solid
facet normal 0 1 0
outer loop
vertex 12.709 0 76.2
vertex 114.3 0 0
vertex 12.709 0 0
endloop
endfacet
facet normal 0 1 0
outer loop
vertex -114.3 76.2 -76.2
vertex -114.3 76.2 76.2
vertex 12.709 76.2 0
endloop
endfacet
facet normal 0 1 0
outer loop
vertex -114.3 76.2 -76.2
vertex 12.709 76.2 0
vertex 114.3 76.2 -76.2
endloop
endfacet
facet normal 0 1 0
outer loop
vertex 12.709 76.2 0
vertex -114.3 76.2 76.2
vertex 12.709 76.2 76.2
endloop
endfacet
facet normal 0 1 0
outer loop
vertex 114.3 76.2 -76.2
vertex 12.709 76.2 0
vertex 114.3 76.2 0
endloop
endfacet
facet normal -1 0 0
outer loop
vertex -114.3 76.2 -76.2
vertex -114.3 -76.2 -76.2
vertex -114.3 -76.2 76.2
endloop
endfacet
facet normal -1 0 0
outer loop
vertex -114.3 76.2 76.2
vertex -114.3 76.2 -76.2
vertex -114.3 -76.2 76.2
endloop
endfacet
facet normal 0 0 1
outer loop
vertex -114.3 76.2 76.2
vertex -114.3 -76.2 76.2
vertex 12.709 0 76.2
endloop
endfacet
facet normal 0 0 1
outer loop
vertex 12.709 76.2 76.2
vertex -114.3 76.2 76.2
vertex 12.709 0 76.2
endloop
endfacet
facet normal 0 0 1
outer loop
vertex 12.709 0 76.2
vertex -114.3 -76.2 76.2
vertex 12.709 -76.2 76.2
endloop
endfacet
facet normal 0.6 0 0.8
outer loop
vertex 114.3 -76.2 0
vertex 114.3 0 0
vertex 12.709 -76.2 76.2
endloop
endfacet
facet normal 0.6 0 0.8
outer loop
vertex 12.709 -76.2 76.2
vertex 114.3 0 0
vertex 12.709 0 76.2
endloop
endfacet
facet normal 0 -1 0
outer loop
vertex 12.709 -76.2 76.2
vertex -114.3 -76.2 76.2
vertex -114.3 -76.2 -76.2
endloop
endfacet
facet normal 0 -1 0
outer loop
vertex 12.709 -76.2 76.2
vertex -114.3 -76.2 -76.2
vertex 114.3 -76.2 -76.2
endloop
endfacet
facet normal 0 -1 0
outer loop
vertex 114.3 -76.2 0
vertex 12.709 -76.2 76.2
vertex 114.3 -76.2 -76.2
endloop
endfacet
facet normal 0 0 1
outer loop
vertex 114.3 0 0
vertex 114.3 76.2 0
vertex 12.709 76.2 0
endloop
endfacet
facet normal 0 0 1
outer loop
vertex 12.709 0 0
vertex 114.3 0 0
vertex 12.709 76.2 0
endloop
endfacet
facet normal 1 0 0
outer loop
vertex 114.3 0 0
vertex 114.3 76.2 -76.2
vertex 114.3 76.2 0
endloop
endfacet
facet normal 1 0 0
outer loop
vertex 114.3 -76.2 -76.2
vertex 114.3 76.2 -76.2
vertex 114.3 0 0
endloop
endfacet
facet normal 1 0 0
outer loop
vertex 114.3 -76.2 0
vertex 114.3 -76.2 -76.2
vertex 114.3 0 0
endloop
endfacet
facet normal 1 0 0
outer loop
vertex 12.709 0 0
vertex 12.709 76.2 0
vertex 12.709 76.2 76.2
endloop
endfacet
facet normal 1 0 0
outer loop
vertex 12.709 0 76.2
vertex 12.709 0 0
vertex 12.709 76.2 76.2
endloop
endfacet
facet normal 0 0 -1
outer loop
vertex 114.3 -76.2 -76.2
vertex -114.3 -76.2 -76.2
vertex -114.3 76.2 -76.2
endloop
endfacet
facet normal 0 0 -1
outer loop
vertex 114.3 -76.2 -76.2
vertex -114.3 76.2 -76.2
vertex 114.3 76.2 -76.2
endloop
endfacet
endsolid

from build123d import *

# Parameters (mm, degrees)
F0_W     = 228.6
F0_H     = 152.4
F1_DEPTH = 76.2
F3_DEPTH = 152.401
F5_DEPTH = 76.2


with BuildPart() as f1:
    # F0 (on Front) → F1 (new body, symmetric)
    with BuildSketch(Plane.XZ):
        Rectangle(F0_W, F0_H)
    extrude(amount=F1_DEPTH, both=True)

    # F2 (on face) → F3 (cut, through all)
    with BuildSketch(Plane(origin=(0, 76.2, 0), x_dir=(-1, 0, 0), z_dir=(0, 1, 0))):
        Polygon((-114.3, 0), (-12.709387, 76.2), (-114.3, 76.2), align=None)
    extrude(amount=-F3_DEPTH, mode=Mode.SUBTRACT)

    # F4 (on face) → F5 (cut)
    with BuildSketch(Plane(origin=(0, 76.2, 0), x_dir=(-1, 0, 0), z_dir=(0, 1, 0))):
        Polygon((-12.709387, 0), (-12.709387, 76.2), (-114.3, 0), align=None)
    extrude(amount=-F5_DEPTH, mode=Mode.SUBTRACT)


solid = f1.part
